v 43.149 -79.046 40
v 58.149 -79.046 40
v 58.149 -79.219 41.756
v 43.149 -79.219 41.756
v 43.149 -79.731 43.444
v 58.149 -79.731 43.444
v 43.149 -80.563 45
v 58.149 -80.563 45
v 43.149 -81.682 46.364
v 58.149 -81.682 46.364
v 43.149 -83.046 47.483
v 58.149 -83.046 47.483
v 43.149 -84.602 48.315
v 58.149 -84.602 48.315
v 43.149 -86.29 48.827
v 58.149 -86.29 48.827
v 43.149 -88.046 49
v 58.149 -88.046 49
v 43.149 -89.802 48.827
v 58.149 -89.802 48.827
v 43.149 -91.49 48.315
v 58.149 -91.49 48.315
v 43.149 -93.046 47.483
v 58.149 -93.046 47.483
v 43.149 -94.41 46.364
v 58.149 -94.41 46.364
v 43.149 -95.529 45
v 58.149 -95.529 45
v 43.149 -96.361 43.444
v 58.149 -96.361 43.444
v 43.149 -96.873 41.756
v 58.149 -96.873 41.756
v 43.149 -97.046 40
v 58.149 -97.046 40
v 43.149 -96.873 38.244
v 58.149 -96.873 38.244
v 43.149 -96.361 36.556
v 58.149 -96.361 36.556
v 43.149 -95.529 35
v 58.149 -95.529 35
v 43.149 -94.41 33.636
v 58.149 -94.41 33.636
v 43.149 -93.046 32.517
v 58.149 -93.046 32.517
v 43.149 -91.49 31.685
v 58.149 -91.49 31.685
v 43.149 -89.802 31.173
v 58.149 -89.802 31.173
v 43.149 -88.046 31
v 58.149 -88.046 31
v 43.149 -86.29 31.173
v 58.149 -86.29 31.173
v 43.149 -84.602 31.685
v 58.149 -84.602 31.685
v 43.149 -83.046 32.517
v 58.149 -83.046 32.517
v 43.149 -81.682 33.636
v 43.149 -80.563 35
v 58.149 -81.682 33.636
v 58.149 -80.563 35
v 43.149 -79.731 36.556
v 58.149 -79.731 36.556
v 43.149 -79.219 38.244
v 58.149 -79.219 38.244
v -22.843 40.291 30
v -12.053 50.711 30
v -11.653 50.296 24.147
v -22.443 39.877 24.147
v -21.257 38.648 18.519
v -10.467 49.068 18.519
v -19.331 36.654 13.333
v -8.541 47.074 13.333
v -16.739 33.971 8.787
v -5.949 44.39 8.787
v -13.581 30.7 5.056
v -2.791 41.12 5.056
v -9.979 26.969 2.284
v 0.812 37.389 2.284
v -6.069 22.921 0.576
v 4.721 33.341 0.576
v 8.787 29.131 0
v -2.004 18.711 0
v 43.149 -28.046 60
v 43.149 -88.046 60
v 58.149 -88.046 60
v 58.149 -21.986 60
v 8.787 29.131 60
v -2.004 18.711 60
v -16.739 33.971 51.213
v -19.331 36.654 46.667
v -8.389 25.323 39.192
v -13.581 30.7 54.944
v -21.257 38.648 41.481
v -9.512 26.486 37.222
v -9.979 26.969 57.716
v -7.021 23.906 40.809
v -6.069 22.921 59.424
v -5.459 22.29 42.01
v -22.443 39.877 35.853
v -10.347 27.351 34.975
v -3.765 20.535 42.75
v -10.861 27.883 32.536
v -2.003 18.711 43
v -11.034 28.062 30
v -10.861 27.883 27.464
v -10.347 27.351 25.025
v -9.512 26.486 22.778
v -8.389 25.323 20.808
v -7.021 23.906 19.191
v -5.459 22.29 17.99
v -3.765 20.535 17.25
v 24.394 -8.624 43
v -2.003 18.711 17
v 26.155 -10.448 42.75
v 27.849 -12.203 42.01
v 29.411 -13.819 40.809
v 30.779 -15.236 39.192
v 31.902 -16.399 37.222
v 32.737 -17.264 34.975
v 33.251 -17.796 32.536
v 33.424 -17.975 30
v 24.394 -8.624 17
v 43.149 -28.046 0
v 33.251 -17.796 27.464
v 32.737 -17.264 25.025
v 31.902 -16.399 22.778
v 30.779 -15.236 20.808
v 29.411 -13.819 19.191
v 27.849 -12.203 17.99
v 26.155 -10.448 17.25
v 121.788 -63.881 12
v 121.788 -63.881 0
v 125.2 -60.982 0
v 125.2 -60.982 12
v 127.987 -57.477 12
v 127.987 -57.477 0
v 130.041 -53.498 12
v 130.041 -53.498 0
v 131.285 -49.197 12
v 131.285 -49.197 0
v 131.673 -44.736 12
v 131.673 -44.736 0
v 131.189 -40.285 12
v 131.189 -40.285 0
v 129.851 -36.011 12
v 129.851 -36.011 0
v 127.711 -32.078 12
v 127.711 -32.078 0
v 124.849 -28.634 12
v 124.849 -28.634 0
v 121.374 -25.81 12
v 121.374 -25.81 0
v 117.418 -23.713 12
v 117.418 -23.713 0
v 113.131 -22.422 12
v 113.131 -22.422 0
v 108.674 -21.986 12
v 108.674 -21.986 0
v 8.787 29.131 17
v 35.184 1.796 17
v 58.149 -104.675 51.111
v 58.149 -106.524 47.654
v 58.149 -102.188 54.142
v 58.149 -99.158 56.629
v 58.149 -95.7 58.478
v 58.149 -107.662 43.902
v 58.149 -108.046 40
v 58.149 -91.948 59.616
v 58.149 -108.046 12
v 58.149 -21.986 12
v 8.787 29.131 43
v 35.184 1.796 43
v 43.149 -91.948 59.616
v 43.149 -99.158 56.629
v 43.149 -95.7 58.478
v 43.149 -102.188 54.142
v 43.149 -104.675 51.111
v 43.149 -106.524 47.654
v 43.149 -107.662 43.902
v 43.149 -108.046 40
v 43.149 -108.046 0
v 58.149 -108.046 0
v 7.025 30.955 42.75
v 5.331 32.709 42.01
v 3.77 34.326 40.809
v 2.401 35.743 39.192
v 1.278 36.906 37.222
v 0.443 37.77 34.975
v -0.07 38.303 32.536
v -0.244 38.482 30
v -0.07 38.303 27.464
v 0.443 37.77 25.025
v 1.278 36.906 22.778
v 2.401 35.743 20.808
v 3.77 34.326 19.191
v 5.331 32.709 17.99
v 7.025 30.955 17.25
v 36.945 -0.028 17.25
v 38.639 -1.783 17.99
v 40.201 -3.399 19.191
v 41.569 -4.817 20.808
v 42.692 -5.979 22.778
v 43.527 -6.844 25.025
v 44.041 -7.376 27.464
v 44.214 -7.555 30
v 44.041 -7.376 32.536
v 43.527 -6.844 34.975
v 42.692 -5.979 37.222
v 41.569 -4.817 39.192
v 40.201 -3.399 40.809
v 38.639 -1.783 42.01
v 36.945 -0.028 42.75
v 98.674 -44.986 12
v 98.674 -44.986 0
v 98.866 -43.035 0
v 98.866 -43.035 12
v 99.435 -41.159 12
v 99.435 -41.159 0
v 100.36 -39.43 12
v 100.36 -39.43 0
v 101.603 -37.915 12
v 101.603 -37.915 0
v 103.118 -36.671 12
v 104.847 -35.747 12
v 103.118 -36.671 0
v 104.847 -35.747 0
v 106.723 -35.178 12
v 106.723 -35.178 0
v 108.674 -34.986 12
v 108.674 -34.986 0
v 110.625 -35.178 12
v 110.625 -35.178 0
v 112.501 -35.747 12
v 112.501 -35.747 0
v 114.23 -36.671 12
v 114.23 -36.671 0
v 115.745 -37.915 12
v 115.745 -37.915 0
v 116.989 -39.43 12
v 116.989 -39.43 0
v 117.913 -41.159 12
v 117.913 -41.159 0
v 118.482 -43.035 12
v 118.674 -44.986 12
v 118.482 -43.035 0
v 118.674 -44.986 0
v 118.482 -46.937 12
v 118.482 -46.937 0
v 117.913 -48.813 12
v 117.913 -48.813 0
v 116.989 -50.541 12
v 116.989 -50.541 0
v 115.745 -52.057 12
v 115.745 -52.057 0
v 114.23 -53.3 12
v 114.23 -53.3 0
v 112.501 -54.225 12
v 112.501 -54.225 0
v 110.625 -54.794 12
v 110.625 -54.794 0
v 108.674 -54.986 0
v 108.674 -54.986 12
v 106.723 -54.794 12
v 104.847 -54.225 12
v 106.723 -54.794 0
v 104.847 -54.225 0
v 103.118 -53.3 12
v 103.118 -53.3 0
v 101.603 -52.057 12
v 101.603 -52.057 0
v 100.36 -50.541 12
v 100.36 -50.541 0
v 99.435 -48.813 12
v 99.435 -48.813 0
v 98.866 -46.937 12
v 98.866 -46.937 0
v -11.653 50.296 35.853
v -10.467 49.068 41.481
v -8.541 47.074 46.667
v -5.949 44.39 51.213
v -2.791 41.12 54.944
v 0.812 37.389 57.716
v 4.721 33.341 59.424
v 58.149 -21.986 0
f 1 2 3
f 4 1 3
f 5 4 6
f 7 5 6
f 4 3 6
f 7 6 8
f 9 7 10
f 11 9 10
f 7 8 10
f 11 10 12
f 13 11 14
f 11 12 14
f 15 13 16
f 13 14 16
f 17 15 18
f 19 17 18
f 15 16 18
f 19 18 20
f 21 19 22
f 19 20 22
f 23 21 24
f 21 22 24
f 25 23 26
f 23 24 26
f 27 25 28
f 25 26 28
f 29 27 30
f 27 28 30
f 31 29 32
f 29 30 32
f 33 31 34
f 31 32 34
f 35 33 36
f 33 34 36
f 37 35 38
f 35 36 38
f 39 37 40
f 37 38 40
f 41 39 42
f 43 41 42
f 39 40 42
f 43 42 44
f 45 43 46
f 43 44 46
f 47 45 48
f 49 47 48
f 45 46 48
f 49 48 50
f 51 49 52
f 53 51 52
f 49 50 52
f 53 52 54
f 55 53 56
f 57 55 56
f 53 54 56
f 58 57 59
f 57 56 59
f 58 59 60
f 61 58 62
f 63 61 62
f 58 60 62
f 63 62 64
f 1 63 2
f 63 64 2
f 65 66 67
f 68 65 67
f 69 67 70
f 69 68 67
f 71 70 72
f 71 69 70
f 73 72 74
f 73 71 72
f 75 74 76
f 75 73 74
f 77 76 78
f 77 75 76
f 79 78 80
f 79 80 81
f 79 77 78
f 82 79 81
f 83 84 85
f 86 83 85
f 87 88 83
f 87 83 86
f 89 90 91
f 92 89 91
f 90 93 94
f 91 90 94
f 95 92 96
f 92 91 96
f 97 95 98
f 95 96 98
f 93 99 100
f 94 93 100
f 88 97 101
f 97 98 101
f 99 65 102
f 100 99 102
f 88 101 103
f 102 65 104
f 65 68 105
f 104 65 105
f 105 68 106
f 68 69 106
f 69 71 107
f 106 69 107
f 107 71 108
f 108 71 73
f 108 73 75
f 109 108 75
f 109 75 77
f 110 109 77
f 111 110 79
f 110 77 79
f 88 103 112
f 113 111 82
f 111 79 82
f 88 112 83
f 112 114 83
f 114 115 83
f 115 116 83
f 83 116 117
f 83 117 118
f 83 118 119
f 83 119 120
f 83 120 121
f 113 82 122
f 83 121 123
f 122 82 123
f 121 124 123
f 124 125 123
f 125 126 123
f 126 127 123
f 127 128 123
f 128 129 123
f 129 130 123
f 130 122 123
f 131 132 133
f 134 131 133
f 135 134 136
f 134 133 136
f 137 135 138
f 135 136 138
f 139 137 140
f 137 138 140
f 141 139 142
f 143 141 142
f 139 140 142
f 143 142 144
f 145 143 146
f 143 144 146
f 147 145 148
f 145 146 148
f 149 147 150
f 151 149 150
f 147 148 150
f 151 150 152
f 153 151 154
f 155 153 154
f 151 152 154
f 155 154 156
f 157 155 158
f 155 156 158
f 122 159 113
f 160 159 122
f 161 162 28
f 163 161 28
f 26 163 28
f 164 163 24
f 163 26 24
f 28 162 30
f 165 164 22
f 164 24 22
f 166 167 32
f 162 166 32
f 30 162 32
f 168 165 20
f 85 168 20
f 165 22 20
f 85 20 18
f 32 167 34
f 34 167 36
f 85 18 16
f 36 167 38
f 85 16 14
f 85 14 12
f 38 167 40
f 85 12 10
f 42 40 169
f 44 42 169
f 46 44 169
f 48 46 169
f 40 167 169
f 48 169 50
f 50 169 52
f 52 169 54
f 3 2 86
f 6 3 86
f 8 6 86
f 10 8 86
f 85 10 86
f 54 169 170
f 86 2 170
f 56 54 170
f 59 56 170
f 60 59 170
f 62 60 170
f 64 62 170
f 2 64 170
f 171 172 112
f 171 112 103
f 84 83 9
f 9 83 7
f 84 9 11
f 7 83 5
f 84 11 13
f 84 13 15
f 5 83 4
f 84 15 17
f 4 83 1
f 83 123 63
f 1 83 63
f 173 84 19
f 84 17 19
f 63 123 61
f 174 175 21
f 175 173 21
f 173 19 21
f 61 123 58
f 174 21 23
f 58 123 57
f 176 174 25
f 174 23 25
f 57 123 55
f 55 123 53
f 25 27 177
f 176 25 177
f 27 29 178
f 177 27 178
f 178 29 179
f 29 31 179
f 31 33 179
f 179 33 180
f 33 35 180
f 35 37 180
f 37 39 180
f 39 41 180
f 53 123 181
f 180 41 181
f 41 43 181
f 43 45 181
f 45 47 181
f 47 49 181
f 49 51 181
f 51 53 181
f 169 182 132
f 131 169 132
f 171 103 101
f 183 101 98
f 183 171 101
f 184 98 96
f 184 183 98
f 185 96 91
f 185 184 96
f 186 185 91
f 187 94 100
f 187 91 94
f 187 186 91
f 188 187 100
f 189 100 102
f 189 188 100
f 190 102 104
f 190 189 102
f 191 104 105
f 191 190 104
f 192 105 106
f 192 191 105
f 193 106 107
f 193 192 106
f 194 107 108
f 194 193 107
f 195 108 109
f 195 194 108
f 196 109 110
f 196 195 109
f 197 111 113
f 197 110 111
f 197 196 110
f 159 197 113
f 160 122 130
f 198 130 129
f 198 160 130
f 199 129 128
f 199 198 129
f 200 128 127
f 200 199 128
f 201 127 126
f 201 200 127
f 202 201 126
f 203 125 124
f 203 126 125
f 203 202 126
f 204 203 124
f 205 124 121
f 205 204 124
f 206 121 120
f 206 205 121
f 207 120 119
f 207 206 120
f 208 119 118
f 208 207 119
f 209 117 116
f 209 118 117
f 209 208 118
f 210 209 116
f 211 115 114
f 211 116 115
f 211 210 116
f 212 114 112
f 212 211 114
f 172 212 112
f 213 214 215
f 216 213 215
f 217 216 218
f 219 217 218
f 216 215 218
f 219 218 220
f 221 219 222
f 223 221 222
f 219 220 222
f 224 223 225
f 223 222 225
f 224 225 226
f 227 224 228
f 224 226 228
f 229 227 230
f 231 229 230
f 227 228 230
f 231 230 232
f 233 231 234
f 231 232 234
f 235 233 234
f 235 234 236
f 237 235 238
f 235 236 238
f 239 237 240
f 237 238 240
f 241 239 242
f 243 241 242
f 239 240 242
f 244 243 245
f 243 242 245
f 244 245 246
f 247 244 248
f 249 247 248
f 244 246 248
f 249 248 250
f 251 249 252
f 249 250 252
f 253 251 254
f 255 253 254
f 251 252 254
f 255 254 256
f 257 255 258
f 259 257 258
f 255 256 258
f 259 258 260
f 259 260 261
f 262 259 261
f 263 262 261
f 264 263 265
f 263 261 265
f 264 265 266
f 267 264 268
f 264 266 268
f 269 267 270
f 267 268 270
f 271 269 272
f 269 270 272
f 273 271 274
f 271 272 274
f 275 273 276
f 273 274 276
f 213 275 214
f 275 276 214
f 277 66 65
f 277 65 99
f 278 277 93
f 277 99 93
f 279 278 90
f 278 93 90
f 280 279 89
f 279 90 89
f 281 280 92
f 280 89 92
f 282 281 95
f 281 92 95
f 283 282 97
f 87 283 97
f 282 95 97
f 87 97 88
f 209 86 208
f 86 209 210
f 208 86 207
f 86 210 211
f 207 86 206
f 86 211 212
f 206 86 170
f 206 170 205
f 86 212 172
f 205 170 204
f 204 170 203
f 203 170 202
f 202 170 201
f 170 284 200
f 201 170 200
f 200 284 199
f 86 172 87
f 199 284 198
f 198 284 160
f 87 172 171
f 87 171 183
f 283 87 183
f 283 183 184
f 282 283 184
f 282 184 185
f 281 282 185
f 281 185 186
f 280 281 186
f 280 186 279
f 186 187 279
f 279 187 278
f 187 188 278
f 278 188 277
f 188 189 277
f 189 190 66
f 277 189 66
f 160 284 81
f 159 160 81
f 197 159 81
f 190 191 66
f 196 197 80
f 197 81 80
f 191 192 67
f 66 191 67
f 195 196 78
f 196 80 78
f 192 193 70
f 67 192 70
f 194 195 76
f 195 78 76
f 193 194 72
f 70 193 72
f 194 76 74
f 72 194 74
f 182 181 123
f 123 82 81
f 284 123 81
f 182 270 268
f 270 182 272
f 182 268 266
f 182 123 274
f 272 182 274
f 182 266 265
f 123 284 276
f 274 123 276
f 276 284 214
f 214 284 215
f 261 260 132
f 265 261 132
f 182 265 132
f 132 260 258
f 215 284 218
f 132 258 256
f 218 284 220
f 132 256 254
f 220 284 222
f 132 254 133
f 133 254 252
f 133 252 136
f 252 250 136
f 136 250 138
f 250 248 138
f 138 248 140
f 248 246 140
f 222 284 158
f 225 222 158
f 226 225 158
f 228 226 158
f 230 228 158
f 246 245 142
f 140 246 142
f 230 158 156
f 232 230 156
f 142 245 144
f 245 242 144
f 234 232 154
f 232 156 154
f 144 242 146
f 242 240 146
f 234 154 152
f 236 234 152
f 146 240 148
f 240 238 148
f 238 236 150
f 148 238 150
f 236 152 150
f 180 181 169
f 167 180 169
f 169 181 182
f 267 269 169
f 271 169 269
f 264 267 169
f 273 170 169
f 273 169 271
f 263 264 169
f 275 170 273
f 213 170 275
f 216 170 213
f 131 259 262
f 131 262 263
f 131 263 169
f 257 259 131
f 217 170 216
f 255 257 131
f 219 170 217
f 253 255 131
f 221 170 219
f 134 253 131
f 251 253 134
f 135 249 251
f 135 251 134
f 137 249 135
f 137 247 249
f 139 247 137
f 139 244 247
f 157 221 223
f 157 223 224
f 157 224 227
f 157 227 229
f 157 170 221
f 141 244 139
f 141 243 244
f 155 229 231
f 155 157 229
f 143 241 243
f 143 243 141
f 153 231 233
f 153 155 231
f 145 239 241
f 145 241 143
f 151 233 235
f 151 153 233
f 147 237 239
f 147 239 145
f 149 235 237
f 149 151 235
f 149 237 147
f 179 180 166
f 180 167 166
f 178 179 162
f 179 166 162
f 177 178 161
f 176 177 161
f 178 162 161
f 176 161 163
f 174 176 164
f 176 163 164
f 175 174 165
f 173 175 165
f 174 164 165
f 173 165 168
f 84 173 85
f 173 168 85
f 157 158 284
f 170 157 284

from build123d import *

# Parameters (mm, degrees)
EXTRUDE_1_DEPTH     = 60
FILLET_1_R          = 30
CUT_EXTRUDE_1_DEPTH = 147.1512713
SKETCH_4_R          = 10
EXTRUDE_3_DEPTH     = 12
FILLET_2_R          = 20
SKETCH_5_R          = 9
CUT_EXTRUDE_3_DEPTH = 15


with BuildPart() as part:
    # 스케치1 → 보스-돌출1 (new body)
    with BuildSketch(Plane.XY):
        Polygon((-22.843222842, 40.291179042), (43.149322352, -28.04610199), (43.149322352, -108.04610199), (58.149322352, -108.04610199), (58.149322352, -21.985708603), (-12.053125837, 50.711054599), align=None)
    extrude(amount=EXTRUDE_1_DEPTH)

    # 필렛1
    fillet_1_edges = [part.edges().sort_by_distance(p)[0] for p in [
        (-17.448174339, 45.50111682, 0),
        (-17.448174339, 45.50111682, 60),
    ]]
    fillet(fillet_1_edges, radius=FILLET_1_R - 0.0001)  # a hair under: the kernel refuses the full size

    # 스케치2 → 컷-돌출1 (cut, through all)
    with BuildSketch(Plane(origin=(19.103194466, 18.447740459, 0), x_dir=(0, 0, -1), z_dir=(0.7193398003386495, 0.694658370458999, 0))):
        with BuildLine():
            Line((-17, 14.851284643), (-17, -23.148715357))
            ThreePointArc((-17, -23.148715357), (-30, -36.148715357), (-43, -23.148715357))
            Line((-43, -23.148715357), (-43, 14.851284643))
            ThreePointArc((-43, 14.851284643), (-30, 27.851284643), (-17, 14.851284643))
        make_face()
    extrude(amount=-CUT_EXTRUDE_1_DEPTH, mode=Mode.SUBTRACT)

    # 스케치4 → 보스-돌출3 (add)
    with BuildSketch(Plane(origin=(0, 0, 0), x_dir=(-1, 0, 0), z_dir=(0, 0, -1))):
        with BuildLine():
            ThreePointArc((-121.787629996, -63.881157116), (-130.624090494, -38.115312537), (-108.674200792, -21.985708603))
            Line((-108.674200792, -21.985708603), (-58.149322352, -21.985708603))
            Line((-58.149322352, -21.985708603), (-58.149322352, -108.04610199))
            Line((-58.149322352, -108.04610199), (-121.787629996, -63.881157116))
        make_face()
        with Locations((-108.674200792, -44.985708603)):
            Circle(SKETCH_4_R, mode=Mode.SUBTRACT)
    extrude(amount=-EXTRUDE_3_DEPTH)

    # 필렛2
    fillet_2_edges = [part.edges().sort_by_distance(p)[0] for p in [
        (50.649322352, -108.04610199, 60),
    ]]
    fillet(fillet_2_edges, radius=FILLET_2_R)

    # 스케치5 → 컷-돌출3 (cut)
    with BuildSketch(Plane(origin=(58.149322352, 0, 0), x_dir=(0, 0, -1), z_dir=(1, 0, 0))):
        with Locations(Location((-40, -88.04610199, 0), (0, 0, 90))):
            Circle(SKETCH_5_R)
    extrude(amount=-CUT_EXTRUDE_3_DEPTH, mode=Mode.SUBTRACT)


solid = part.part
